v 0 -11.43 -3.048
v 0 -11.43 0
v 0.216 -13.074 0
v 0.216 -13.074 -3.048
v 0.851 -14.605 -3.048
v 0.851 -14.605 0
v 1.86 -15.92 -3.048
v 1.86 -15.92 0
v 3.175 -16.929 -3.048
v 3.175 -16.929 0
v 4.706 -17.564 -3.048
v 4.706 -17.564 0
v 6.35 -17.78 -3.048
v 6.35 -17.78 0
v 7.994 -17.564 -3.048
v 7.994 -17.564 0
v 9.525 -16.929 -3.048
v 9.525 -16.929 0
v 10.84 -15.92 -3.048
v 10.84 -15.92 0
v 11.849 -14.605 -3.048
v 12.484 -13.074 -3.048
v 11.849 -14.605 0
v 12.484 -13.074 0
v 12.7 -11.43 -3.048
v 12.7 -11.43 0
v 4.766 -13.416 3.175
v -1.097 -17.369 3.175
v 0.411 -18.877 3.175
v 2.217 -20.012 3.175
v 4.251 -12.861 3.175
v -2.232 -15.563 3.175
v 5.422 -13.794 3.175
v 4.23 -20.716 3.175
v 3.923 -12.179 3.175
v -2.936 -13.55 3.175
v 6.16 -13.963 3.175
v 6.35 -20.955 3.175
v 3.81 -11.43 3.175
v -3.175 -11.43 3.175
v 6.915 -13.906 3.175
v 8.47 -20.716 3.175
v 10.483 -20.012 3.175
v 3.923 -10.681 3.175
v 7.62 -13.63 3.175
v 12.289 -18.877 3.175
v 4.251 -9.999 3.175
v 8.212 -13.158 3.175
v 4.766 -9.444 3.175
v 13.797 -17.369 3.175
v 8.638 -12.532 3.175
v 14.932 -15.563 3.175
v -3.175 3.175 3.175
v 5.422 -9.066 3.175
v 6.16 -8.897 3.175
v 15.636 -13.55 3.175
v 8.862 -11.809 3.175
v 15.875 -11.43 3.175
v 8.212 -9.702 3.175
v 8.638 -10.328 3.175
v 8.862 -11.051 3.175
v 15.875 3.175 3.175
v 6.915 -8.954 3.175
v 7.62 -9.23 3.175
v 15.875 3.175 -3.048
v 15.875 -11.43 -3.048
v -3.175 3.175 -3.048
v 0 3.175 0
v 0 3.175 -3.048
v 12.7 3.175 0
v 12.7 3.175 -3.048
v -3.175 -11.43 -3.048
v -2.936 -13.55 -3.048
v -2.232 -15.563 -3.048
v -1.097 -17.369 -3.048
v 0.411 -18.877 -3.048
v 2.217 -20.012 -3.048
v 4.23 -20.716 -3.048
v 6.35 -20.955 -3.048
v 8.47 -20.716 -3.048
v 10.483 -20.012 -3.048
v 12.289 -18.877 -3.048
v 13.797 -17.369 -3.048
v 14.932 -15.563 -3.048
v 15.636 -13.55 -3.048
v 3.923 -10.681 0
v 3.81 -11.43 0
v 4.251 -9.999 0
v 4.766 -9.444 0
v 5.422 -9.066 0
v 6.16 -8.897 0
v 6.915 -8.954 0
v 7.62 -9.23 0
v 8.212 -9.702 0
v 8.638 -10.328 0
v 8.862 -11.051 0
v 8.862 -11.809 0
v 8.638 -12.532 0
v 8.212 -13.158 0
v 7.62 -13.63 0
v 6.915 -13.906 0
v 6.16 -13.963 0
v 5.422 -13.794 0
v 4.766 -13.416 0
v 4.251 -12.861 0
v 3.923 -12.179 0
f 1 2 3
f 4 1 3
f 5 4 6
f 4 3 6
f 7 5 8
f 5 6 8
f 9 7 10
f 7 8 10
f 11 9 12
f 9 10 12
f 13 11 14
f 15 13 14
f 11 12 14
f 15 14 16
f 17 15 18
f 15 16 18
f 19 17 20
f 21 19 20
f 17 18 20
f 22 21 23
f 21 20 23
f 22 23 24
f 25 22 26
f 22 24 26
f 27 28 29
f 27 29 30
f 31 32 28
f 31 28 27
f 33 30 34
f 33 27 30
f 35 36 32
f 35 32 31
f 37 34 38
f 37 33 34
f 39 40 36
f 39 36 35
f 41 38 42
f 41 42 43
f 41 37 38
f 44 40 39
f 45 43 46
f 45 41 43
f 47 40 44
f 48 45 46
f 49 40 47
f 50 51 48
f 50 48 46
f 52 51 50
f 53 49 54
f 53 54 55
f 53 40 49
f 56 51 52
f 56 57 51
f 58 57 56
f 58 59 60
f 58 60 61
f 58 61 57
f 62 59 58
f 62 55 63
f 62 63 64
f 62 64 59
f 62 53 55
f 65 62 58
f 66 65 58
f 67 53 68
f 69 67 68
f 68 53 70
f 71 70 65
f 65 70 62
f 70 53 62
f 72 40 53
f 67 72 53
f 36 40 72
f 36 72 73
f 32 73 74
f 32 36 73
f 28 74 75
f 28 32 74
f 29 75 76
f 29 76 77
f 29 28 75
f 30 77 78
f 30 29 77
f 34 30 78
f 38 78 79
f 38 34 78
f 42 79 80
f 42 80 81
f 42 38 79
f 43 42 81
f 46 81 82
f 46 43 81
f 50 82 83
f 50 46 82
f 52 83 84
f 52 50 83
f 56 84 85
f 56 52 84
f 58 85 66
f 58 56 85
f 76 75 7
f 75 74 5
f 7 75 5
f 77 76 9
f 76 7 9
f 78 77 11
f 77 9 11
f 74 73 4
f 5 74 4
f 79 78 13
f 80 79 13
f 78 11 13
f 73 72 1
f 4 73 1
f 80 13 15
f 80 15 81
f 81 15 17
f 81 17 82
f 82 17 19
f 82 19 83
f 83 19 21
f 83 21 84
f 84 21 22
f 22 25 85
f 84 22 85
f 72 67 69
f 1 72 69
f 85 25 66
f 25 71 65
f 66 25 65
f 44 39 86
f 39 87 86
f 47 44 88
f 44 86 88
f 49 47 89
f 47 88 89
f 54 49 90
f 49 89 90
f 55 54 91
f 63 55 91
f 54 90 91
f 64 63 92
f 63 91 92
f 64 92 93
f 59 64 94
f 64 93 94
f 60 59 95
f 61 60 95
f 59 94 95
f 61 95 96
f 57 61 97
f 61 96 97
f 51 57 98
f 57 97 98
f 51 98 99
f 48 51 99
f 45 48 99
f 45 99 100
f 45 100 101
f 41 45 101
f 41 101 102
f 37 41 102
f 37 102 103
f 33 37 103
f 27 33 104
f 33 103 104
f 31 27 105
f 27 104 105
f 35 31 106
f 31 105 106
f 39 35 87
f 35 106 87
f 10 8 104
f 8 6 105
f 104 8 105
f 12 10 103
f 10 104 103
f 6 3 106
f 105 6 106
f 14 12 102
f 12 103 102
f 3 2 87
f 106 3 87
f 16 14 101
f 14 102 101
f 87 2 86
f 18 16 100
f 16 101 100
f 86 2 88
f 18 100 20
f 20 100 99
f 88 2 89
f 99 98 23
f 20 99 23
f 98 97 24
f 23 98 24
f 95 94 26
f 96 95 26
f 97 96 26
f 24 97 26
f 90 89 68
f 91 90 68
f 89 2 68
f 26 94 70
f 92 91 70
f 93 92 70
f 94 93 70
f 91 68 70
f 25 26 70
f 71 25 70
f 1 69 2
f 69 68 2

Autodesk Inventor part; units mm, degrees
ref_plane "YZ Plane" through (0, 0, 0) normal (1, 0, 0) x (0, 1, 0)
ref_plane "XZ Plane" through (0, 0, 0) normal (0, 1, 0) x (-1, 0, 0)
ref_plane "XY Plane" through (0, 0, 0) normal (0, 0, 1) x (1, 0, 0)
sketch "Sketch1" plane through (0, 0, 0) normal (0, 0, 1) x (1, 0, 0)
  line L0 (0, 0) -> (12.7, 0)
  line L1 (12.7, 0) -> (12.7, -11.43)
  line L2 (6.35, -17.78) -> (6.35, -17.78)
  line L3 (0, -11.43) -> (0, 0)
  arc A0 (6.35, -17.78) -> (12.7, -11.43) centre (6.35, -11.43) ccw
  arc A1 (0, -11.43) -> (6.35, -17.78) centre (6.35, -11.43) ccw
  point P0 (12.7, -17.78)
  point P1 (0, -17.78)
  dimension "d0" = 12.7
  dimension "d1" = 17.78
  dimension "d2" = 6.35
extrude "Extrusion1" add sketch "Sketch1" along normal blind 3.175
sketch "Sketch2" plane through (0, 0, 3.175) normal (0, 0, 1) x (1, 0, 0)
  line L0 (12.7, 0) -> (0, 0) projected
  line L1 (0, 0) -> (0, -11.43) projected
  arc A0 (0, -11.43) -> (12.7, -11.43) centre (6.35, -11.43) ccw projected
  line L2 (12.7, -11.43) -> (12.7, 0) projected
  line L3 (-3.175, 3.175) -> (15.875, 3.175)
  line L4 (15.875, 3.175) -> (15.875, -11.43)
  arc A1 (-3.175, -11.43) -> (15.875, -11.43) centre (6.35, -11.43) ccw
  line L5 (-3.175, -11.43) -> (-3.175, 3.175)
  dimension "d5" = 3.175
extrude "Extrusion2" add sketch "Sketch2" against normal blind 6.223
sketch "Sketch3" plane through (0, 0, -3.048) normal (0, 0, -1) x (-1, 0, 0)
  line L0 (-15.875, 3.175) -> (-15.875, -11.43) projected
  line L1 (-15.875, 3.175) -> (3.351, 3.175)
  line L2 (3.351, 3.175) -> (3.351, 0)
  line L3 (3.351, 0) -> (-15.875, 0)
  line L4 (-15.875, 0) -> (-15.875, 3.175)
  line L5 (-12.7, 0) -> (0, 0) projected
  line L6 (3.175, 3.175) -> (-15.875, 3.175) projected
  line L7 (-12.7, 0) -> (0, 0)
  line L8 (0, 0) -> (0, 3.175)
  line L9 (0, 3.175) -> (-12.7, 3.175)
  line L10 (-12.7, 3.175) -> (-12.7, 0)
extrude "Extrusion3" cut sketch "Sketch3" against normal blind 3.048 contours L1 L8 L3 L10
sketch "Sketch4" plane through (0, 0, 0) normal (0, 0, -1) x (-1, 0, 0)
  arc A0 (-12.7, -11.43) -> (0, -11.43) centre (-6.35, -11.43) ccw projected
  circle A1 centre (-6.35, -11.43) radius 2.54
  point P0 (0, 0)
  dimension "d10" = 5.08
extrude "Extrusion4" cut sketch "Sketch4" against normal blind 25.4
properties part number "new jewel fail"
